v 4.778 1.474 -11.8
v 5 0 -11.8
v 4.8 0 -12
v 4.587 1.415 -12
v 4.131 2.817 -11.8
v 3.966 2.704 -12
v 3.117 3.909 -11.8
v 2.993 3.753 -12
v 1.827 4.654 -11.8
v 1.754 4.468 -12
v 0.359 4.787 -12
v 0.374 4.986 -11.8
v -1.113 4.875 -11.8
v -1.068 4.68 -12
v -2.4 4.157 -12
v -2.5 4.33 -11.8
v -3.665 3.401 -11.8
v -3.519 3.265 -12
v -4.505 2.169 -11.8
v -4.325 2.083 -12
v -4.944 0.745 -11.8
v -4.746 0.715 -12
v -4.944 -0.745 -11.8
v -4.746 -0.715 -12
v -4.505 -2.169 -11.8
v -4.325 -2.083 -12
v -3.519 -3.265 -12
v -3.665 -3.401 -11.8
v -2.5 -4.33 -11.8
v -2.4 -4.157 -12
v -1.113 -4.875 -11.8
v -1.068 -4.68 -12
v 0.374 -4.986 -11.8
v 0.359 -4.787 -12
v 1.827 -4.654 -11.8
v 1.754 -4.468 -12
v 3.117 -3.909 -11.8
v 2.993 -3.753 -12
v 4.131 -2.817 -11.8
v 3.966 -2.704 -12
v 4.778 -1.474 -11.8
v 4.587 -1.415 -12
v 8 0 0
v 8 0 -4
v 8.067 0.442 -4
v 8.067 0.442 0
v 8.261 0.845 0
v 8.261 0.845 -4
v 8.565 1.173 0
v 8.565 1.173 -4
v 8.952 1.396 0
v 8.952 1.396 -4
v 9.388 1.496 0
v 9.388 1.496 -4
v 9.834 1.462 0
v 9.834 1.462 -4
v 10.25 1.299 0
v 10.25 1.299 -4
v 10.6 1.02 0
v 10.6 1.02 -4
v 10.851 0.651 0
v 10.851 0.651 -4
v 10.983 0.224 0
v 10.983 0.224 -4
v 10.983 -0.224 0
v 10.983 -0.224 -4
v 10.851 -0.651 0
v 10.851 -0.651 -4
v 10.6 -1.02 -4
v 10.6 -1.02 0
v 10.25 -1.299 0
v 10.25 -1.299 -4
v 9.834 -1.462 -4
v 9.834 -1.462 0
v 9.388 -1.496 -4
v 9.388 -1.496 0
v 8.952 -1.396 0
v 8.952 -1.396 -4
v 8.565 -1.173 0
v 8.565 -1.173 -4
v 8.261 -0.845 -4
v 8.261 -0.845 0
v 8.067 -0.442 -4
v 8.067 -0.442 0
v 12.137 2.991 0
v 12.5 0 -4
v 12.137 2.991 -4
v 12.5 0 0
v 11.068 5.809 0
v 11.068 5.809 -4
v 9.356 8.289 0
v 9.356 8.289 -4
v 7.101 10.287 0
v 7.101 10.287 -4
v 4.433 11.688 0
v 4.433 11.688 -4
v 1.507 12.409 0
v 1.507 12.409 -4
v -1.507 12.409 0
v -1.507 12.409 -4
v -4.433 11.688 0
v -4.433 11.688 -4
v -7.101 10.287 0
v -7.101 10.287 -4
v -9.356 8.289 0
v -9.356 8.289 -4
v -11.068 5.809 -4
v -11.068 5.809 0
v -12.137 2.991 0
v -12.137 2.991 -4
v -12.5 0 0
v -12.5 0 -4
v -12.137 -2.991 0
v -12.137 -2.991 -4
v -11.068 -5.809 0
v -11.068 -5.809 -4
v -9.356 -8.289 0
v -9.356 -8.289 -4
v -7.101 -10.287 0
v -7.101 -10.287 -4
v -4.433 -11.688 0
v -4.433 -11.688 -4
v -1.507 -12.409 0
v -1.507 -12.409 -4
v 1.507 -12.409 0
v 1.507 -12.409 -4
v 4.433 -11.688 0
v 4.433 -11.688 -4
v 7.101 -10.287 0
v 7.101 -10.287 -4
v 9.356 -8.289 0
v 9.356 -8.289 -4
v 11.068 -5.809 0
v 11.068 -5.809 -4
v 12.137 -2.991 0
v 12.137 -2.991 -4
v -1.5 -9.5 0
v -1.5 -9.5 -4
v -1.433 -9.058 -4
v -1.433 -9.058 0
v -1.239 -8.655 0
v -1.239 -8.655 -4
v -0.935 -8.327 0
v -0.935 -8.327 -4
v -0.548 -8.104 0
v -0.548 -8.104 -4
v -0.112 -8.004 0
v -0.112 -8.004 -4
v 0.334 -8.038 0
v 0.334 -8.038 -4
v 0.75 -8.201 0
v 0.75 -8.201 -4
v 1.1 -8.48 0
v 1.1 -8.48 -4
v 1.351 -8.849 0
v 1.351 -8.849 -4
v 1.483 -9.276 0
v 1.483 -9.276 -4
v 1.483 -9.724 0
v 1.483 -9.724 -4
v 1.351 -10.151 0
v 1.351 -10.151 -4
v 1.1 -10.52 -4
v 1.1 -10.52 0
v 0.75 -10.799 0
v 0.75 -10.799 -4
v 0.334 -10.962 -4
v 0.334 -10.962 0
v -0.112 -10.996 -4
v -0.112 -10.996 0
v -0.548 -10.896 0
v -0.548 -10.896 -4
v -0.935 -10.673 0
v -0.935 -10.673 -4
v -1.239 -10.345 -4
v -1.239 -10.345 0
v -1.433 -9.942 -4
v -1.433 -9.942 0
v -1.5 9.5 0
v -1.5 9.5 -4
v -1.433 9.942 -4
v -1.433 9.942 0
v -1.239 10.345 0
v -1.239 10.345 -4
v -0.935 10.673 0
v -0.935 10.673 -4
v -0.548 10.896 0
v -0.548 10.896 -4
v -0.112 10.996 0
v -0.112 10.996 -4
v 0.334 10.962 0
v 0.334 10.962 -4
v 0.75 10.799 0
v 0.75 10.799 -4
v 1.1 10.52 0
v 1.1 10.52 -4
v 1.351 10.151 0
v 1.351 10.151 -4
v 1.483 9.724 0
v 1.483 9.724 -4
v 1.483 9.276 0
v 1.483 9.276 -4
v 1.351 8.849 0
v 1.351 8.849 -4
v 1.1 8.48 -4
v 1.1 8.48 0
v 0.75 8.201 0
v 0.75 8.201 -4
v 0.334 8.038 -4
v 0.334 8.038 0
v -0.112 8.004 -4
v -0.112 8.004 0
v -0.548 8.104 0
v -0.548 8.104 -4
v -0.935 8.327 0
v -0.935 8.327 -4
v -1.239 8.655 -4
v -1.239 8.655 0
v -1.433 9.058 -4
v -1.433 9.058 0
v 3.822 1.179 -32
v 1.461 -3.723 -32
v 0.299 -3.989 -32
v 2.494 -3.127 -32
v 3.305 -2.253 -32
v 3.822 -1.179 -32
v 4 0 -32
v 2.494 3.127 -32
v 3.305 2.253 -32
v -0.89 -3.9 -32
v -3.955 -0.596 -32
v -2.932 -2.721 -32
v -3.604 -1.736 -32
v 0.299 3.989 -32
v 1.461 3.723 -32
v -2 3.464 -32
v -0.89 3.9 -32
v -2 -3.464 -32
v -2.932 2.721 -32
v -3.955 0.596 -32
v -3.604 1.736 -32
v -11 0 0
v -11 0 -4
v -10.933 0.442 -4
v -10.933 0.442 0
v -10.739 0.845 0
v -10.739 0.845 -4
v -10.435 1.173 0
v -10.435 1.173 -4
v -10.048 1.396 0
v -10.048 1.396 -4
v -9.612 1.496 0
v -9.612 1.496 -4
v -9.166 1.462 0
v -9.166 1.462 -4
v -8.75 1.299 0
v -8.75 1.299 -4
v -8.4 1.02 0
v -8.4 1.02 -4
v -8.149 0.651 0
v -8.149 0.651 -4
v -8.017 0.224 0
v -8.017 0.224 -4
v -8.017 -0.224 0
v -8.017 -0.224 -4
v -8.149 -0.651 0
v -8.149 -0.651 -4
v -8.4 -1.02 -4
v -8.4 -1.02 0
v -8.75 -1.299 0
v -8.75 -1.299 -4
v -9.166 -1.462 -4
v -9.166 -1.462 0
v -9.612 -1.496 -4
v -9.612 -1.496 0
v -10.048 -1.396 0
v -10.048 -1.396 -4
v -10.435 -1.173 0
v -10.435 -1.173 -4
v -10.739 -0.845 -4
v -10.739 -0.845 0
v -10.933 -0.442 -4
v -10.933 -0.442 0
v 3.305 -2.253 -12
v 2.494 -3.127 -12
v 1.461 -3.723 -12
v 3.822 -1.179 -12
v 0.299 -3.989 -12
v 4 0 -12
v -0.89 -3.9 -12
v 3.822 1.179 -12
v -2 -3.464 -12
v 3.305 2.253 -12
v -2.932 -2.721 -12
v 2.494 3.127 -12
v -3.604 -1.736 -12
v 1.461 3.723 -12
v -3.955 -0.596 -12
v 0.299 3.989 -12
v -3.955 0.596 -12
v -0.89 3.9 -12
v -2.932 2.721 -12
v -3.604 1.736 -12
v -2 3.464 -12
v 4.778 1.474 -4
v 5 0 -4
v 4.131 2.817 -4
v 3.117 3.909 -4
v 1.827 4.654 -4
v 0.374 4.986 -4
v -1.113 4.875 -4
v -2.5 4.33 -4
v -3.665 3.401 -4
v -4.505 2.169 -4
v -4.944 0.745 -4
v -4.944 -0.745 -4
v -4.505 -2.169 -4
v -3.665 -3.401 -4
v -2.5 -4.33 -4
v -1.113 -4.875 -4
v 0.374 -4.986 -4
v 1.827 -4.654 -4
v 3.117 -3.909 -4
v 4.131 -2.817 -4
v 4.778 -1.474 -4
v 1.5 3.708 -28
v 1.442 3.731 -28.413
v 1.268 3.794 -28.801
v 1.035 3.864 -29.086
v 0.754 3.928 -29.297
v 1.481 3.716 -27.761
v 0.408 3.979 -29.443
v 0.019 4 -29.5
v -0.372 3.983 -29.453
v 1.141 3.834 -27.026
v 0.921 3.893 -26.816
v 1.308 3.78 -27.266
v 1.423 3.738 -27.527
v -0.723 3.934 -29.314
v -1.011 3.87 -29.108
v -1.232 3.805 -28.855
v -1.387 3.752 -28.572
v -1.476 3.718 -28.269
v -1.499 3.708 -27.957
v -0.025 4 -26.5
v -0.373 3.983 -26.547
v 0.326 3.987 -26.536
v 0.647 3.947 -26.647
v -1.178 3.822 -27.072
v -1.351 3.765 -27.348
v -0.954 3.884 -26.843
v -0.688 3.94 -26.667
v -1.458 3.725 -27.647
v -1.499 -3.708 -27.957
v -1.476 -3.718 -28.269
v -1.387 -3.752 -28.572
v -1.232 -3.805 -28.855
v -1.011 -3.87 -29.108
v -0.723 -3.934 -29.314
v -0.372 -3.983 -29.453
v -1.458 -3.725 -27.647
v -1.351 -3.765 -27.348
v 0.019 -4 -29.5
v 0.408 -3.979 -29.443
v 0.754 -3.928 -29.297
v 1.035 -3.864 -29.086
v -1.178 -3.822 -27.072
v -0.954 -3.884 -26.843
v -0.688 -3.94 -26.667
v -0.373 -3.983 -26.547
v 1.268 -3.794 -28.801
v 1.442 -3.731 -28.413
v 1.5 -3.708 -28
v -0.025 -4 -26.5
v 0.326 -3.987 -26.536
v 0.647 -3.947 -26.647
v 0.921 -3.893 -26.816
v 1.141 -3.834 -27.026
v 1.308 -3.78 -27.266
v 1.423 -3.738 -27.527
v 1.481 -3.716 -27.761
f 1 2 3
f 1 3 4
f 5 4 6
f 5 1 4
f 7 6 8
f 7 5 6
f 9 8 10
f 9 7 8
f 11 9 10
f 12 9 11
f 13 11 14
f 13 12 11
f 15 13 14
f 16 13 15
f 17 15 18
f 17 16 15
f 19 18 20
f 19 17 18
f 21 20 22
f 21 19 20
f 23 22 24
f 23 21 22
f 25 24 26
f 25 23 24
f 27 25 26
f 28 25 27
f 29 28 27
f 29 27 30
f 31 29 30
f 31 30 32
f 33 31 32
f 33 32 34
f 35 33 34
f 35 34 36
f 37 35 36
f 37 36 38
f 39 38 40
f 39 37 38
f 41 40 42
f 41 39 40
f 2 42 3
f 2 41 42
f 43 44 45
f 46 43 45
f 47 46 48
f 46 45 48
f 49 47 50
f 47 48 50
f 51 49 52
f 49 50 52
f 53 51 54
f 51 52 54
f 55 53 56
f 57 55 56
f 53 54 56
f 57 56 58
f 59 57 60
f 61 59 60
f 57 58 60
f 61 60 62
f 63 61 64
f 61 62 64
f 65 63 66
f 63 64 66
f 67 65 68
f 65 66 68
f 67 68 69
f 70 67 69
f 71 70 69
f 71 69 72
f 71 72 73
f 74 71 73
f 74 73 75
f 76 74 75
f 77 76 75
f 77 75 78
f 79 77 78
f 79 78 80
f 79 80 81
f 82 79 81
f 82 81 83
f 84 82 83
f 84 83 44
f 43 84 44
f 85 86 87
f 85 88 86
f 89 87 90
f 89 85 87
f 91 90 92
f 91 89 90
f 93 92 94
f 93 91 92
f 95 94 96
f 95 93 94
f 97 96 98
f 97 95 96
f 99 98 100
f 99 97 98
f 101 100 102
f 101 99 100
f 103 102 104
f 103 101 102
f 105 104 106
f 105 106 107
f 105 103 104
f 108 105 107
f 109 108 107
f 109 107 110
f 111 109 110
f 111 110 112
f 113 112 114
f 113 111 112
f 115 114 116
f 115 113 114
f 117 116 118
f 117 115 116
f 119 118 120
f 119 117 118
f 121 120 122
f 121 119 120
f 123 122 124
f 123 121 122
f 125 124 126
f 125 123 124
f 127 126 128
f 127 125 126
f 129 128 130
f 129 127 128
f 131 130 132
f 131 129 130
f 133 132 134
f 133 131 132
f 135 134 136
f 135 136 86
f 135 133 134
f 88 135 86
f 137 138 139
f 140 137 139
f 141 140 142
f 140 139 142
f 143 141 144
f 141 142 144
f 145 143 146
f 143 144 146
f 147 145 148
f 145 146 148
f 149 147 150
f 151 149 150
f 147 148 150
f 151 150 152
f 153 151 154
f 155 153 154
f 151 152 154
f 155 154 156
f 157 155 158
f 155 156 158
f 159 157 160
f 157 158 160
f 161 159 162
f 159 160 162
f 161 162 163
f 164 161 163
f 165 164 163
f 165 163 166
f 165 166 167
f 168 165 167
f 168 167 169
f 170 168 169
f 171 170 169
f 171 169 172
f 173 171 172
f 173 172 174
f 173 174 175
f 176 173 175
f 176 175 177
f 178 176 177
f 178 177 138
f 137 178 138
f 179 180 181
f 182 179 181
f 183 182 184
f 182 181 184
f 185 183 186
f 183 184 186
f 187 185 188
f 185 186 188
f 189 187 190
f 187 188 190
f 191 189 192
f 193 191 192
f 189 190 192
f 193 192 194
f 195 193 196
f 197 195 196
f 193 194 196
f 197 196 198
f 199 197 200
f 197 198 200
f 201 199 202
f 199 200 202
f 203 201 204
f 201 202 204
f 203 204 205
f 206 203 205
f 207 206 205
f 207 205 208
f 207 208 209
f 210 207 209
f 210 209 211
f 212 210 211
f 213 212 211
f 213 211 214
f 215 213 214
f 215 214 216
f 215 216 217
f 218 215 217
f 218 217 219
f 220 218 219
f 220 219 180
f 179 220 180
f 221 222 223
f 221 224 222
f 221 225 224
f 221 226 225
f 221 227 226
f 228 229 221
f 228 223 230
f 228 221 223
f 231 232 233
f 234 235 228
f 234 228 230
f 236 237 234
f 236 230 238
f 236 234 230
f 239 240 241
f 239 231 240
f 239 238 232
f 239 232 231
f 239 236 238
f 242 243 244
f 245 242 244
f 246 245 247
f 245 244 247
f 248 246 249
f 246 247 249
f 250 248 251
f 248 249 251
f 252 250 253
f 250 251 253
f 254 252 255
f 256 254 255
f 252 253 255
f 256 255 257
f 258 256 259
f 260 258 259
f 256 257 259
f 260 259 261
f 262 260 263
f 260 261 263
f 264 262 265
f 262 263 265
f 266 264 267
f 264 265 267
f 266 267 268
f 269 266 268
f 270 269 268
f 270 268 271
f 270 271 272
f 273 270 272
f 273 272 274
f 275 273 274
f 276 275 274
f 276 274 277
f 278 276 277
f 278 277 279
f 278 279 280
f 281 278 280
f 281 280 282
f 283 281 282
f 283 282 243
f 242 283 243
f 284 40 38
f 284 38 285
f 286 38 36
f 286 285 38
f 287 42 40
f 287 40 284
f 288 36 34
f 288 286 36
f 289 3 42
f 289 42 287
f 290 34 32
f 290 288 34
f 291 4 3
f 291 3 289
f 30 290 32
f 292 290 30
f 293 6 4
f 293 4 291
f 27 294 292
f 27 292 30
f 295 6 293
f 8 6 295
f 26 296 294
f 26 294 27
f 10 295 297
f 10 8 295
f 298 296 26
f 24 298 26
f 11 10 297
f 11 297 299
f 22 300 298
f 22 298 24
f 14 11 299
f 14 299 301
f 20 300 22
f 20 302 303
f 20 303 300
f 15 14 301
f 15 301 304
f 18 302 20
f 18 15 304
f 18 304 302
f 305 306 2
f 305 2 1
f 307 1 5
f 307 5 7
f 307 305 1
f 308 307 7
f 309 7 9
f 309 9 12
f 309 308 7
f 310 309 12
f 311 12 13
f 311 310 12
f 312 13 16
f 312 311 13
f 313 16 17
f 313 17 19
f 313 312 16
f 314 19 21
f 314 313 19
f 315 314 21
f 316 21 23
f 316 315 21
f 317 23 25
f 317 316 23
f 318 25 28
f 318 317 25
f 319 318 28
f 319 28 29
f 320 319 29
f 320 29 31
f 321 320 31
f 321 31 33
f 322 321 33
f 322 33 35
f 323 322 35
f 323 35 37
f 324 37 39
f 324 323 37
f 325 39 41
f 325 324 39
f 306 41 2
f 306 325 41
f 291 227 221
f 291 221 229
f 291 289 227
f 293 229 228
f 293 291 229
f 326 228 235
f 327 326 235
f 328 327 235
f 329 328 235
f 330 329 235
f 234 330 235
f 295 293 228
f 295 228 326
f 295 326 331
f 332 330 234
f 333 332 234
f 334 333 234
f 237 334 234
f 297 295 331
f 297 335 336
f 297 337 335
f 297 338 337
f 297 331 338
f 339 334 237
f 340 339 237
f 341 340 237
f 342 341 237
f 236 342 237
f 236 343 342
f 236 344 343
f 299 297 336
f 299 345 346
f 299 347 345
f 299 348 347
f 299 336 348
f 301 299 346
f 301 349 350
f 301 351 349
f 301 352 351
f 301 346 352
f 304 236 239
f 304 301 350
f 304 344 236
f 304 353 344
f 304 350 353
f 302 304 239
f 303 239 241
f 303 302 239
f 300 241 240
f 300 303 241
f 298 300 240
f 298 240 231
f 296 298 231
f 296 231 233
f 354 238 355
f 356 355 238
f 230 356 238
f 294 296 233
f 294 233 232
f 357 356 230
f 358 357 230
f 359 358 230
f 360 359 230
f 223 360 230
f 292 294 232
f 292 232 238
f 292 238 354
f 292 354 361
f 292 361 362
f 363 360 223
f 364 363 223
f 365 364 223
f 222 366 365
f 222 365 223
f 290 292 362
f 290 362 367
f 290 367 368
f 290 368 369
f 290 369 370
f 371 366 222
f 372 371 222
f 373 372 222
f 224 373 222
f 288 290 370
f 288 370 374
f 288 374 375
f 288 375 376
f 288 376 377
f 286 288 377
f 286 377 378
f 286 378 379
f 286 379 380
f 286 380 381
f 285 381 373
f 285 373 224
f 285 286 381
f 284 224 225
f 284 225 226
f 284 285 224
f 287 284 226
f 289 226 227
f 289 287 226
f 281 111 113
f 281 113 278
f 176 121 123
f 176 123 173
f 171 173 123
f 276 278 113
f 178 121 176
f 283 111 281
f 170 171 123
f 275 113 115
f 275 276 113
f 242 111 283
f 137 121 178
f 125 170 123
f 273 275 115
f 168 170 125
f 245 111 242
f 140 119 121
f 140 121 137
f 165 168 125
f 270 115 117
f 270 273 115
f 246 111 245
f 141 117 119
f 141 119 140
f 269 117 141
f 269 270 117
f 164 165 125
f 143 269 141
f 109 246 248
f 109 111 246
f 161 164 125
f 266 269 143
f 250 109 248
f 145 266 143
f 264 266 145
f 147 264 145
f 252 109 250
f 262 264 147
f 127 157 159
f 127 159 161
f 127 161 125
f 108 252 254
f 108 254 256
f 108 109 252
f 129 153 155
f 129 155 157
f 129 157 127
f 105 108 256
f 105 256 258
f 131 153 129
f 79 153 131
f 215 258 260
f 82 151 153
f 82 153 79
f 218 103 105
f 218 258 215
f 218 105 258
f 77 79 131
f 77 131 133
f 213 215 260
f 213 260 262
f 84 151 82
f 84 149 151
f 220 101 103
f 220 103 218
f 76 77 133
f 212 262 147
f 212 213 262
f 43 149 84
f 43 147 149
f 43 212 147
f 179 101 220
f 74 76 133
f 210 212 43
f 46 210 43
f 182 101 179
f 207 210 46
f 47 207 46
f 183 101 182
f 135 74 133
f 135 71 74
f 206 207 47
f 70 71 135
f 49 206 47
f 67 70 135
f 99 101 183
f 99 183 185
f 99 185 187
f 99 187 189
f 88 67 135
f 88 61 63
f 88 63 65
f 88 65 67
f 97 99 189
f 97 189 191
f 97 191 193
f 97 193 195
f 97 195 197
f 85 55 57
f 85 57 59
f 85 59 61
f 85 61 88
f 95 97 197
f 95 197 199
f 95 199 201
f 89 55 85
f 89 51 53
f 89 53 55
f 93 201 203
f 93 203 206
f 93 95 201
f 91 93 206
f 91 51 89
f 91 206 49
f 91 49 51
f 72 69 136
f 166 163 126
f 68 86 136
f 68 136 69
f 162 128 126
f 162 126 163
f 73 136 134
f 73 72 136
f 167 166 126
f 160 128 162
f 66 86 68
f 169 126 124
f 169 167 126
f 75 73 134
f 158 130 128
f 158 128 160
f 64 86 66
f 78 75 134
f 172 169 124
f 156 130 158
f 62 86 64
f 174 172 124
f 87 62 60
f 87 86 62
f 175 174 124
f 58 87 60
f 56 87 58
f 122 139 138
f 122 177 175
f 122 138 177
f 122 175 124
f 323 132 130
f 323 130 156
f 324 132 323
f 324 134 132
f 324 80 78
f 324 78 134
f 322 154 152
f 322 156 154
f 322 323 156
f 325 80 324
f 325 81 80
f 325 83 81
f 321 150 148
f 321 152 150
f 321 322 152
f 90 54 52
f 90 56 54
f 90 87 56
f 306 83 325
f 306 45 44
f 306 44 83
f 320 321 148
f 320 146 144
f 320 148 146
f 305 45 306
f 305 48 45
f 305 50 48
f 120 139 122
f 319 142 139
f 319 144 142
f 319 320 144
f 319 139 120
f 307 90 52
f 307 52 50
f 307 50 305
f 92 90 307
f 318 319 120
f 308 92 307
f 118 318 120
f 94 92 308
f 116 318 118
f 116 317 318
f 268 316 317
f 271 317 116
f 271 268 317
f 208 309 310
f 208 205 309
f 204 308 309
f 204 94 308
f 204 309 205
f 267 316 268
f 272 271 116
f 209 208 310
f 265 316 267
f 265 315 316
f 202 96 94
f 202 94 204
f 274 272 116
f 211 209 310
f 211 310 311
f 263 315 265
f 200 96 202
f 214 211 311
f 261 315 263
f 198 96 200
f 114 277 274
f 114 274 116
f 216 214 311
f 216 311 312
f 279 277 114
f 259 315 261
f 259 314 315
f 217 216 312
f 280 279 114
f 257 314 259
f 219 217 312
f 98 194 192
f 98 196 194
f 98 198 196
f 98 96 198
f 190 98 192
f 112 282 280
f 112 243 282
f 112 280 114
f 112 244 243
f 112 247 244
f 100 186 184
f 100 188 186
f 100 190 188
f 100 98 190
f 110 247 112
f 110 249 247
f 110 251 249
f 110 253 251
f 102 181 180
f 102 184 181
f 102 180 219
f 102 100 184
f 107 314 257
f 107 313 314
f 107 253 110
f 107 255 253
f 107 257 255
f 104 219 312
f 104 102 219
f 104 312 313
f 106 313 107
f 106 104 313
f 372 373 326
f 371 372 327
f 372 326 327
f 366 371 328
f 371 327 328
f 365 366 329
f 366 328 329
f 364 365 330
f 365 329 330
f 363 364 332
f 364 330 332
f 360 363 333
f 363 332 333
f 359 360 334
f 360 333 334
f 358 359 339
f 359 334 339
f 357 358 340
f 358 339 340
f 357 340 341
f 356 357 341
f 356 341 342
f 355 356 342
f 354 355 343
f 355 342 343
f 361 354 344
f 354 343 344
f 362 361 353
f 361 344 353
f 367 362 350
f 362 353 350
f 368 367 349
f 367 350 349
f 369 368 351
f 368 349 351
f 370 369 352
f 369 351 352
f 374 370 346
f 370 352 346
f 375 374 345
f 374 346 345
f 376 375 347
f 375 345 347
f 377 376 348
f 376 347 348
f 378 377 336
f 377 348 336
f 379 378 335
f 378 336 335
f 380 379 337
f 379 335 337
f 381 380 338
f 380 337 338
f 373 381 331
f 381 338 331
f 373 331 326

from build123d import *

# Parameters (mm, degrees)
SKETCH7_R               = 1.5
CUT_EXTRUDE1_DEPTH      = 5
CHAMFER1_SIZE           = 0.2
SKETCH4_R               = 1.5
CUT_EXTRUDE2_DEPTH      = 13.5
CUT_EXTRUDE2_DEPTH_BACK = 13.5


with BuildPart() as part:
    # Sketch1 → Revolve1 (revolve)
    with BuildSketch(Plane(origin=(0, 0, 0), x_dir=(1, 0, 0), z_dir=(0, 1, 0))):
        Polygon((0, 0), (0, 32), (4, 32), (4, 12), (5, 12), (5, 4), (12.5, 4), (12.5, 0), align=None)
    revolve(axis=Axis((0, 0, 0), (0, 0, 1)))

    # Sketch7 → Cut-Extrude1 (cut, through all)
    with BuildSketch(Plane(origin=(0, 0, -4), x_dir=(-1, 0, 0), z_dir=(0, 0, -1))):
        with Locations((-9.5, 0)):
            Circle(SKETCH7_R)
        with Locations((0, 9.5)):
            Circle(SKETCH7_R)
        with Locations((9.5, 0)):
            Circle(SKETCH7_R)
        with Locations((0, -9.5)):
            Circle(SKETCH7_R)
    extrude(amount=-CUT_EXTRUDE1_DEPTH, mode=Mode.SUBTRACT)

    # Chamfer1
    chamfer1_edges = [part.edges().sort_by_distance(p)[0] for p in [
        (-5, 0, -12),
    ]]
    chamfer(chamfer1_edges, length=CHAMFER1_SIZE)

    # Sketch4 → Cut-Extrude2 (cut, two sides)
    with BuildSketch(Plane(origin=(0, 0, 0), x_dir=(1, 0, 0), z_dir=(0, 1, 0))) as cut_extrude2_sk:
        with Locations((0, 28)):
            Circle(SKETCH4_R)
    extrude(amount=CUT_EXTRUDE2_DEPTH, mode=Mode.SUBTRACT)
    extrude(cut_extrude2_sk.sketch, amount=-CUT_EXTRUDE2_DEPTH_BACK, mode=Mode.SUBTRACT)


solid = part.part
